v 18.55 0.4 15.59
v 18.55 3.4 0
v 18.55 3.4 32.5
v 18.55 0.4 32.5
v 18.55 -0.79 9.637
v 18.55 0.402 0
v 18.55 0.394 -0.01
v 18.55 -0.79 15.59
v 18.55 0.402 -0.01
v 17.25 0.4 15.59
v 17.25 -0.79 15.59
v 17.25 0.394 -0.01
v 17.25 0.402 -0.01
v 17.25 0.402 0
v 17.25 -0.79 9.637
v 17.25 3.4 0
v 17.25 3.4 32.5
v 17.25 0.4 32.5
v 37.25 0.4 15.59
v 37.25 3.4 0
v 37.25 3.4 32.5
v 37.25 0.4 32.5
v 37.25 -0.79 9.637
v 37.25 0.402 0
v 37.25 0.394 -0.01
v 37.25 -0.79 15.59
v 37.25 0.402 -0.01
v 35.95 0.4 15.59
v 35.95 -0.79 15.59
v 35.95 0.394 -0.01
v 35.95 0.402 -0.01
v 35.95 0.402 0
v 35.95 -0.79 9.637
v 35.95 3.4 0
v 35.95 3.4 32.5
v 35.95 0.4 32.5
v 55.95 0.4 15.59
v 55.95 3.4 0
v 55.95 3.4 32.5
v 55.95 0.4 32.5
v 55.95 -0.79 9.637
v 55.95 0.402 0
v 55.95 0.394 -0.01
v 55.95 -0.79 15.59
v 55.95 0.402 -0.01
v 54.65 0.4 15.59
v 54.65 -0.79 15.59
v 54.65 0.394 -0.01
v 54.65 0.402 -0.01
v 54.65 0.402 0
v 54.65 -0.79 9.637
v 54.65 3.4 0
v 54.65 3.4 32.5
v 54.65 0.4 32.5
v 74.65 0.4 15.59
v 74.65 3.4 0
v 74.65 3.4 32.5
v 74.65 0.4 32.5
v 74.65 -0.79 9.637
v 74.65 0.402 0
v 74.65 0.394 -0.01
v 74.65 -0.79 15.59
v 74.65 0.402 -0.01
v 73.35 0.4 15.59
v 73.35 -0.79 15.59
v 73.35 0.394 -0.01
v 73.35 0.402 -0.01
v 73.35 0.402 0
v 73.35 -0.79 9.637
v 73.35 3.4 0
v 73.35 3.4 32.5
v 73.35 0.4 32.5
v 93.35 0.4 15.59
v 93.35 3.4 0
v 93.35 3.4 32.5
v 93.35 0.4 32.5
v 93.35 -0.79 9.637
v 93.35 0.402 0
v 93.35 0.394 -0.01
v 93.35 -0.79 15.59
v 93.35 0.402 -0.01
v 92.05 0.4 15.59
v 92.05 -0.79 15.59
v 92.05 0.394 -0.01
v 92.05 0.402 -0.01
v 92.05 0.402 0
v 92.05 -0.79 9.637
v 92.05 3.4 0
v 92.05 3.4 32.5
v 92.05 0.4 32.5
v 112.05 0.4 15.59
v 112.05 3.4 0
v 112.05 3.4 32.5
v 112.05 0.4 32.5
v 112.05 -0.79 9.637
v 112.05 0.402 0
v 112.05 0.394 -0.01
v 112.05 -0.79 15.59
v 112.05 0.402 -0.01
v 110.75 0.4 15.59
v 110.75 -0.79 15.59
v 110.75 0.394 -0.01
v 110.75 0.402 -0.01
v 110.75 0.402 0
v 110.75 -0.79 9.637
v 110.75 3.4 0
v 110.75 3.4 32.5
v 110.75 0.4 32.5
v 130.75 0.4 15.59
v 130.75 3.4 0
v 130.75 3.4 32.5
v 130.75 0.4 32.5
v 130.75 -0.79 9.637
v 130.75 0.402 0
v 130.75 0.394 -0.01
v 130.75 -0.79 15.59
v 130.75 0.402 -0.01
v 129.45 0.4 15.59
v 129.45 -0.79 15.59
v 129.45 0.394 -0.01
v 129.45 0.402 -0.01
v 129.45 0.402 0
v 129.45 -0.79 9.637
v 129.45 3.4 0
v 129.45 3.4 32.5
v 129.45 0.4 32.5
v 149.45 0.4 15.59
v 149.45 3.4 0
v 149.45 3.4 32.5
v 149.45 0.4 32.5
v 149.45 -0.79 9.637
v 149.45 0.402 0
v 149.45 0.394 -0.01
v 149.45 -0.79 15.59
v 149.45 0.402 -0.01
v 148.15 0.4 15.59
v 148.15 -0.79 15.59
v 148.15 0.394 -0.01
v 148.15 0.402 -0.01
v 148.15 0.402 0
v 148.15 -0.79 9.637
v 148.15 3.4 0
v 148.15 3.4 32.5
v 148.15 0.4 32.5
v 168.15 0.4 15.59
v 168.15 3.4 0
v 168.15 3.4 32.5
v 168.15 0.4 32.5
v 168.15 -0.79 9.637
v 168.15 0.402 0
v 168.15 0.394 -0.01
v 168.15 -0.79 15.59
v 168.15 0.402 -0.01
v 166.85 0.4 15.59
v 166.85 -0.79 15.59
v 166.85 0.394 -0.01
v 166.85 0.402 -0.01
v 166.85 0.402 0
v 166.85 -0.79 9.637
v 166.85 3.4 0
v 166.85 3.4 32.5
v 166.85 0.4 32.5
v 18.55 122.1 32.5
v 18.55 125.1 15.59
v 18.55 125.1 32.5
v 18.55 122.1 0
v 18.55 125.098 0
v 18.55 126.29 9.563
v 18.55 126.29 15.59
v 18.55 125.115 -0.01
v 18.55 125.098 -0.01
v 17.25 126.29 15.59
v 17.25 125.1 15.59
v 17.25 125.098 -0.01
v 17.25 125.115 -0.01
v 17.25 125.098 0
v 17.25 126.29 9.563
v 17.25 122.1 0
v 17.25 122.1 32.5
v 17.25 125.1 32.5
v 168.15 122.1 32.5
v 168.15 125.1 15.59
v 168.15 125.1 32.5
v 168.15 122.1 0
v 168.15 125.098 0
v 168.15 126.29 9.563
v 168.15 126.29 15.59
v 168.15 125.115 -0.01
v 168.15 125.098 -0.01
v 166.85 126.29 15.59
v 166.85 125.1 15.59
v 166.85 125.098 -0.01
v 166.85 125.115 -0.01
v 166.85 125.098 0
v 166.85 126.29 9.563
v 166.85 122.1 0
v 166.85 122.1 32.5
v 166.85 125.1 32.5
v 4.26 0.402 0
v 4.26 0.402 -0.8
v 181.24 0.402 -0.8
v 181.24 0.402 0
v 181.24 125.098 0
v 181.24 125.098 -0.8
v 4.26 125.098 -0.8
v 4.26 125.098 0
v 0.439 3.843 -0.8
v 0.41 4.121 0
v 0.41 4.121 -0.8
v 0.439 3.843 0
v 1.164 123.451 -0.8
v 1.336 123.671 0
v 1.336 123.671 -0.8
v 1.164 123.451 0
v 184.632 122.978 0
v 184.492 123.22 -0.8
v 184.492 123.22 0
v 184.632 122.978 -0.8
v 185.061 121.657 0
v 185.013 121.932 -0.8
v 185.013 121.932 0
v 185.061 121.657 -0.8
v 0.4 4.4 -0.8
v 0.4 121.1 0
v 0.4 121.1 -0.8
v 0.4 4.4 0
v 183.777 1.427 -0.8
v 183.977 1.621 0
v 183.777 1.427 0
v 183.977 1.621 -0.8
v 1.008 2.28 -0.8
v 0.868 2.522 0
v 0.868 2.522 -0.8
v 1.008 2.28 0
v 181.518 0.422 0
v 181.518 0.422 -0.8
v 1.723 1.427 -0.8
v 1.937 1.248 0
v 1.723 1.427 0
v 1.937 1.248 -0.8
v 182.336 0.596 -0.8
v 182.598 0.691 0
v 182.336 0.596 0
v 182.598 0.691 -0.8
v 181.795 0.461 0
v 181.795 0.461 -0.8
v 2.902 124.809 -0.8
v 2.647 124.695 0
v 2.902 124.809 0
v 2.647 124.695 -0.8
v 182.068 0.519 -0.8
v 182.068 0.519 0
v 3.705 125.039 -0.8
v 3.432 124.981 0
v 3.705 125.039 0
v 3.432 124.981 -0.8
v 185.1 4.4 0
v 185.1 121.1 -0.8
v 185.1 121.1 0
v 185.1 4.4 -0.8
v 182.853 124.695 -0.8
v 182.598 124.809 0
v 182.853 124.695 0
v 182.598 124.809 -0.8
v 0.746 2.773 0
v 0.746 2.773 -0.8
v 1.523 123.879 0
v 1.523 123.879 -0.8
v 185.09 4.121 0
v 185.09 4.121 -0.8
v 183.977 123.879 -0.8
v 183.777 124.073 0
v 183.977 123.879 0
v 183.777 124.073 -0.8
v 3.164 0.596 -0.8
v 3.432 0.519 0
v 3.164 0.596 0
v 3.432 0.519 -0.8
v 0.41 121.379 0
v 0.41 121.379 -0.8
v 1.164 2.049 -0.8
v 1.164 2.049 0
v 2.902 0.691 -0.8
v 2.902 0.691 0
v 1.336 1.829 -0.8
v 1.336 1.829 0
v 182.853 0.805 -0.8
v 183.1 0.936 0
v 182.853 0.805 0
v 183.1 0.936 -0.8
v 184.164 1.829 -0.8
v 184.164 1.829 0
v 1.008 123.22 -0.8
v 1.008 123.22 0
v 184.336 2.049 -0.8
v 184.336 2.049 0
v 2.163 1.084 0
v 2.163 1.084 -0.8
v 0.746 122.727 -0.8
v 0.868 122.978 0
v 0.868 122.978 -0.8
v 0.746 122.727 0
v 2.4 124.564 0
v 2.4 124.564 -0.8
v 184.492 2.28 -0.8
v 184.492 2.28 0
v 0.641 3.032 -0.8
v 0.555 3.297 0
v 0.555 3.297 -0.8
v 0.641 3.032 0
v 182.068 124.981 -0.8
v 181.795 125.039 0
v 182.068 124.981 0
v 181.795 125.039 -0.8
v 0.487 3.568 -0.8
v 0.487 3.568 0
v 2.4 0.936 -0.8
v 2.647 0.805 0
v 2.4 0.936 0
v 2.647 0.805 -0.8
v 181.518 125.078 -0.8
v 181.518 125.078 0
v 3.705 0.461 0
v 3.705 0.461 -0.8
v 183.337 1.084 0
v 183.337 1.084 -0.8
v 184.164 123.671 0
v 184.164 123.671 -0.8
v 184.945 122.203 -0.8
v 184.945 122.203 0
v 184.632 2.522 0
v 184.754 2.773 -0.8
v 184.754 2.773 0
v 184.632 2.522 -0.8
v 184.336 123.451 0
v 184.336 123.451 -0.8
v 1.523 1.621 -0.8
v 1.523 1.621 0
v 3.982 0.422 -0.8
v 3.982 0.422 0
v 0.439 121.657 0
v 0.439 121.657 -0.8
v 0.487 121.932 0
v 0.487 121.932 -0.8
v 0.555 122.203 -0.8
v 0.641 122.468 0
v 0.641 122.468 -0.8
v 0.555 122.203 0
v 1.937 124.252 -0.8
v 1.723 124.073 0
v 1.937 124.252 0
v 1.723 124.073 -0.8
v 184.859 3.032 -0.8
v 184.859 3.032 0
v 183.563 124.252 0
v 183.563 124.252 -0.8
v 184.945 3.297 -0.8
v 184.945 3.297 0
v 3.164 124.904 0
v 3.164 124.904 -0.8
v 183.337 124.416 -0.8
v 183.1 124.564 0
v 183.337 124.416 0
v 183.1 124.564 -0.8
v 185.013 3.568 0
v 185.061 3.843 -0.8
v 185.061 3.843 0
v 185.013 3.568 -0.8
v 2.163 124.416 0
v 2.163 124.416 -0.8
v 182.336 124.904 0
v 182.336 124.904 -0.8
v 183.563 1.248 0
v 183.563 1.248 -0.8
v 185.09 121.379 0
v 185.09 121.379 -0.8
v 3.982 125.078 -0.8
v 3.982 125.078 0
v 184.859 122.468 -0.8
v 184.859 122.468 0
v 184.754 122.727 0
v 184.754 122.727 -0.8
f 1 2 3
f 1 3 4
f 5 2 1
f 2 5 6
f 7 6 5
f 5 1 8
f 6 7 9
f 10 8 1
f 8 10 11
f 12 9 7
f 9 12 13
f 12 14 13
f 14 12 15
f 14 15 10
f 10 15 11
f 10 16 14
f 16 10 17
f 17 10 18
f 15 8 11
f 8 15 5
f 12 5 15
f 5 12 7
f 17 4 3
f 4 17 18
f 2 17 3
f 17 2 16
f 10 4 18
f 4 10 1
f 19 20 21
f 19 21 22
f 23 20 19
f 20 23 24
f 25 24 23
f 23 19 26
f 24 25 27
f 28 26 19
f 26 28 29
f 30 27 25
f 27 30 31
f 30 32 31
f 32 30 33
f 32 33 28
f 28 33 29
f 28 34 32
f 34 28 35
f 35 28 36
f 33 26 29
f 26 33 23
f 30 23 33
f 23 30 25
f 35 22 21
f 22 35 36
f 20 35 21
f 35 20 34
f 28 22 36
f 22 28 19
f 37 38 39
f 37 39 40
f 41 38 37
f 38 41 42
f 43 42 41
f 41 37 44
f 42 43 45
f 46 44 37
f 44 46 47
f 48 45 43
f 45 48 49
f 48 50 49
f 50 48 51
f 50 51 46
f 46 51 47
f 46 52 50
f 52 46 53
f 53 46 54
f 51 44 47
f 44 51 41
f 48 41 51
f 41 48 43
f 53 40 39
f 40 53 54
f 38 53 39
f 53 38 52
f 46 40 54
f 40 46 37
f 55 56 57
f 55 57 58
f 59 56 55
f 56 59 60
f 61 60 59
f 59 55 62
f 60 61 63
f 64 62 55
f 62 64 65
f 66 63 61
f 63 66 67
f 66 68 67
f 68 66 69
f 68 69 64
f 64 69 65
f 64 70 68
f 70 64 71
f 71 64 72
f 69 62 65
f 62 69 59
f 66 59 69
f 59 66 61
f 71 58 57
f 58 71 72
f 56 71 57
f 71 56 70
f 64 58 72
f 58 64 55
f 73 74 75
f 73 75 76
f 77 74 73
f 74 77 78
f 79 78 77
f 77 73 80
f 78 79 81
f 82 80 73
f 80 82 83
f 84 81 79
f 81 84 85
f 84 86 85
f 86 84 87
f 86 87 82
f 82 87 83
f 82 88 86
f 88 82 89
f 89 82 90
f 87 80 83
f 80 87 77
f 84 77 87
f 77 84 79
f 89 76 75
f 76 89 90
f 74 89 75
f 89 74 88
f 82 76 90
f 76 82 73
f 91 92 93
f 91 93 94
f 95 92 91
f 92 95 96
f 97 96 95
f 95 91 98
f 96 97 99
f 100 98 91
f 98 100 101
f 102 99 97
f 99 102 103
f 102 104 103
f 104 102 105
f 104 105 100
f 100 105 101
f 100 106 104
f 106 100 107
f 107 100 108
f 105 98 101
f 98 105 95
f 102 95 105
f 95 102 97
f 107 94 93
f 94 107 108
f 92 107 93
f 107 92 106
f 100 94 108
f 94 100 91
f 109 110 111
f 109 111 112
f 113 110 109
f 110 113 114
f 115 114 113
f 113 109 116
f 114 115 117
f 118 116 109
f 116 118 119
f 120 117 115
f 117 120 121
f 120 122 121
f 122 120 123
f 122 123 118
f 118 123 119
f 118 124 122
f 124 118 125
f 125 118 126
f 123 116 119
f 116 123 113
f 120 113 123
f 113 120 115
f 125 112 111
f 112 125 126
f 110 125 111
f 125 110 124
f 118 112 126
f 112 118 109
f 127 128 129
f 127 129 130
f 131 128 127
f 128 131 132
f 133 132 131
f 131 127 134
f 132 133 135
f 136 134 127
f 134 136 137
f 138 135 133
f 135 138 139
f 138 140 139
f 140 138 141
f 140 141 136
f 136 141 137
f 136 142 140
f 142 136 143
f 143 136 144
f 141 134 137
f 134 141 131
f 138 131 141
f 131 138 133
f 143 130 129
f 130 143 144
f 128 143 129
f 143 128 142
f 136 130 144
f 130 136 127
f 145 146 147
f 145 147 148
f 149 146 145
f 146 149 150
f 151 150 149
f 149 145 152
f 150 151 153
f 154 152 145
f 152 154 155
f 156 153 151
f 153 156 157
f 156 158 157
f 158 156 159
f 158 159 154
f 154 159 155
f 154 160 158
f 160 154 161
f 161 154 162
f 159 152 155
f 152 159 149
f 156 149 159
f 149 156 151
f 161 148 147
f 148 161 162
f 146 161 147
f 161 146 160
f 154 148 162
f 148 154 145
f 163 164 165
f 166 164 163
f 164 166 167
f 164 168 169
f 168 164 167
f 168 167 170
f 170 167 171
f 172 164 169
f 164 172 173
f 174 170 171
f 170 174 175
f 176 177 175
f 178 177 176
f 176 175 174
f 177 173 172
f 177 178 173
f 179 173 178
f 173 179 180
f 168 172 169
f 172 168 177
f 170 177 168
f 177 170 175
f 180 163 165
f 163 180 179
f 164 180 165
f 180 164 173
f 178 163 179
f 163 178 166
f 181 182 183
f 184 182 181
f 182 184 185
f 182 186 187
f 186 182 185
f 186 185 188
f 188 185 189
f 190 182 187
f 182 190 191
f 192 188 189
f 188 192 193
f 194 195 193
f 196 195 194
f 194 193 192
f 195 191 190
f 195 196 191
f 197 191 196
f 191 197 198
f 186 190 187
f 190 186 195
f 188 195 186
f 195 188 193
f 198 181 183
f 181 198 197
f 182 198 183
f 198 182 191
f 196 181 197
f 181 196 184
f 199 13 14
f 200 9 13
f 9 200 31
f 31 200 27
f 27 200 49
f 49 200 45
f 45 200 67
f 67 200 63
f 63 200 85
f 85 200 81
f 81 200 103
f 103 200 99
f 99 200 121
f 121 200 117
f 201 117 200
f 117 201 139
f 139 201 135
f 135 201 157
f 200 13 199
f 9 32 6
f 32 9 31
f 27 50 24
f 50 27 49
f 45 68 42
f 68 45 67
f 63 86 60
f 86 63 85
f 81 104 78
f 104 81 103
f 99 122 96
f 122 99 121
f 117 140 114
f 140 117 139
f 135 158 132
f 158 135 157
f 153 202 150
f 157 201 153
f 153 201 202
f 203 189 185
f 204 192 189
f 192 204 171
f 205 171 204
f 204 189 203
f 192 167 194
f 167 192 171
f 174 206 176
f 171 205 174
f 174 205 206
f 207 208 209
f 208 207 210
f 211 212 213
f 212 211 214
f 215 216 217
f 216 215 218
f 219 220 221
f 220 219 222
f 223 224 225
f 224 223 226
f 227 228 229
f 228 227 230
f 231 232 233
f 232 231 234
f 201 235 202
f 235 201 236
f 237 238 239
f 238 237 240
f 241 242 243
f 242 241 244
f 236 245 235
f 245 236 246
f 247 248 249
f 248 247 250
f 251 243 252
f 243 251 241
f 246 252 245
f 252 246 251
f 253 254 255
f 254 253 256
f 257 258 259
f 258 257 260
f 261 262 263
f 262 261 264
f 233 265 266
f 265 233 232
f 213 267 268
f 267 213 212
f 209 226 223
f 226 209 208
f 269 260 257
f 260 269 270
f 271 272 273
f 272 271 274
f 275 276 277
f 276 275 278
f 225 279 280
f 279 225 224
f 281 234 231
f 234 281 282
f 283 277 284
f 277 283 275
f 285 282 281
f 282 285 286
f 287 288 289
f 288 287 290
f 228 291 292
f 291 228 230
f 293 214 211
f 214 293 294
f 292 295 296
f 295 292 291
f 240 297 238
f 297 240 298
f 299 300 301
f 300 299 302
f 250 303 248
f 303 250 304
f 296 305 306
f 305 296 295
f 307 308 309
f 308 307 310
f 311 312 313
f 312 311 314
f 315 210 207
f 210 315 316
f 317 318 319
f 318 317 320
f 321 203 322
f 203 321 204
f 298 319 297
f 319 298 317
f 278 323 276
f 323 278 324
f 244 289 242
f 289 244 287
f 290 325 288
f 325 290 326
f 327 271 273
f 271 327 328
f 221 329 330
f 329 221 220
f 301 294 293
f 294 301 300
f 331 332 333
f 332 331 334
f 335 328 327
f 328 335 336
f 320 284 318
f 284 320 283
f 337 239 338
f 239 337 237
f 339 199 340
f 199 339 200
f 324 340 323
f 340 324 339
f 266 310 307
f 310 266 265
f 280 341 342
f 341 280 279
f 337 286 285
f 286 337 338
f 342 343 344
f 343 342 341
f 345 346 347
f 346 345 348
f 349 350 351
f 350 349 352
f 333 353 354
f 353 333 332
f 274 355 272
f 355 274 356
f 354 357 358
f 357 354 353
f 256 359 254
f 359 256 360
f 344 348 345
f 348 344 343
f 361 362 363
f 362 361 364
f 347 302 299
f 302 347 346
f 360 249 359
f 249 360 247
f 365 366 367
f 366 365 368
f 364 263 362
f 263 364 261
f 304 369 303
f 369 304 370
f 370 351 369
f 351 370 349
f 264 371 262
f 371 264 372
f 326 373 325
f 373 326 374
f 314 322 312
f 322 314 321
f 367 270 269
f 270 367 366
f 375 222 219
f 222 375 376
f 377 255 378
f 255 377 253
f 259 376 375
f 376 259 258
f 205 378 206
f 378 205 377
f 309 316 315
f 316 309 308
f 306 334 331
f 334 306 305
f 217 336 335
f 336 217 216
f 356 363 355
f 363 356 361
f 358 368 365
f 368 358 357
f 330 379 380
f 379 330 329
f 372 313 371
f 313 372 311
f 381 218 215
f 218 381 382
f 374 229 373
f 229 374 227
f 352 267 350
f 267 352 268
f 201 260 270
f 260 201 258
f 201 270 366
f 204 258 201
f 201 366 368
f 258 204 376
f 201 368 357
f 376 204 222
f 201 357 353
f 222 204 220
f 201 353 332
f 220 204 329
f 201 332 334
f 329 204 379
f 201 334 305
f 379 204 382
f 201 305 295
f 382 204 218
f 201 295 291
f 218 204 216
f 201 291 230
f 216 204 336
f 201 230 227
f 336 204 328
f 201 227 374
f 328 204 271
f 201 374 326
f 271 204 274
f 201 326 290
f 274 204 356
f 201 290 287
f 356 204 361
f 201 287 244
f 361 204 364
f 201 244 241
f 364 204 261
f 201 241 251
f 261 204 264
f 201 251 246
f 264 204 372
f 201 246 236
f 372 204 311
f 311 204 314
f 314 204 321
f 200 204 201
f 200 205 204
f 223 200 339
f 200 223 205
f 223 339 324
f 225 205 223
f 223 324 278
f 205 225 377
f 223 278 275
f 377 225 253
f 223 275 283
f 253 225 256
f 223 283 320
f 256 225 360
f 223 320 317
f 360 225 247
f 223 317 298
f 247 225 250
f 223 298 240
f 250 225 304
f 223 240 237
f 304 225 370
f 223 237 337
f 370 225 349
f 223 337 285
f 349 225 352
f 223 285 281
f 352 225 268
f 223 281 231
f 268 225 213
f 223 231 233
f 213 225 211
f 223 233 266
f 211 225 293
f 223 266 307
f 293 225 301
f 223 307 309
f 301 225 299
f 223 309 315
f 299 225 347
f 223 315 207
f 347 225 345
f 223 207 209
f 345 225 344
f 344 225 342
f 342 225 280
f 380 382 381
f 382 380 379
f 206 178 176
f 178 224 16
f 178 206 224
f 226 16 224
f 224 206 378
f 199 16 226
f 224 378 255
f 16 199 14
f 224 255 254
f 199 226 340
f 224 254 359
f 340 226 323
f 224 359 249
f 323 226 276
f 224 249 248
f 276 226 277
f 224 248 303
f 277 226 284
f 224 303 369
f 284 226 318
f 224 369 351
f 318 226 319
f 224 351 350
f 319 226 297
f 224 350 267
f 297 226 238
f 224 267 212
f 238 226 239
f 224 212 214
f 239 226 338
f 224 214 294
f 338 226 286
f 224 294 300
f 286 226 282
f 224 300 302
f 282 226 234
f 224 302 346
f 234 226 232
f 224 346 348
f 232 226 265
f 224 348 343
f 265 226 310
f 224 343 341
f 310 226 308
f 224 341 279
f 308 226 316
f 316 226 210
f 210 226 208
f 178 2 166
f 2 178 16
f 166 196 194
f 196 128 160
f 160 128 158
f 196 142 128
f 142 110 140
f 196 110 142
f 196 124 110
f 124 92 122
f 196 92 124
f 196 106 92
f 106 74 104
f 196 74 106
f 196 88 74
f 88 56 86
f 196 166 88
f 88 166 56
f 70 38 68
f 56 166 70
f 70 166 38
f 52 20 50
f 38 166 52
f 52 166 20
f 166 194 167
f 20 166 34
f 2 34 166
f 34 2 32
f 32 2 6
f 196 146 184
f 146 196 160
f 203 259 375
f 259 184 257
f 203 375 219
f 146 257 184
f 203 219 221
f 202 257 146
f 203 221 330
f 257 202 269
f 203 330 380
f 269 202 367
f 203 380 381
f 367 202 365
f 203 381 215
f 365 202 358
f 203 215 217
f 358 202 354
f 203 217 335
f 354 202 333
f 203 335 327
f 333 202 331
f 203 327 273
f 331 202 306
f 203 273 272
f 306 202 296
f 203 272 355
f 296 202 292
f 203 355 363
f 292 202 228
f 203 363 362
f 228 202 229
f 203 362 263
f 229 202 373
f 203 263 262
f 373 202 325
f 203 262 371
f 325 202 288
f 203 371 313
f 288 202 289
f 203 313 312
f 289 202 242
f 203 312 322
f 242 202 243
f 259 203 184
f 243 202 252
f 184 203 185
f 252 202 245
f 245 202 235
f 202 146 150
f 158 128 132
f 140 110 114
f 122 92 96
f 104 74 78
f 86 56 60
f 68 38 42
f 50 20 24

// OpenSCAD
// file: ../../Base/Constants.scad
// Fischertechnik Box Foundation
// Constants

// Constant values necessary for multiple elements

// Base constants
dividerThickness = 1.2;
excess = 0.01;
fragments = 90;
tolerance = 0.8;

// Gets the thickness of a divider 
function getDividerThickness() = dividerThickness;

// Gets the excess that is used to merge walls into each other
function getExcess() = excess;

// Gets amount of fragments of a cylinder
function getFragments() = fragments;

// Gets the inner tolerance of a frame to each side
function getTolerance() = tolerance;


// Fischertechnik specific constants
axisDiameter = 4;
axisBottomDiameter = axisDiameter + 1;
axisTolerance = 0.2;

// Gets axis diameter of Fischertechnik axis
function getAxisDiameter() = axisDiameter;

// Gets axis diameter tolerance (subtracted for element axis)
function getAxisTolerance() = axisTolerance;

// Gets the axis diameter for standing axis
function getStandAxisDiameter() = getAxisDiameter() - getAxisTolerance();

// Gets axis bottom diameter for thicker part at the bottom
function getAxisBottomDiameter() = axisBottomDiameter;

standardEdgeDistance = 2.5;
standardWebDistance = 11.5;
standardCornerLength = 15;

// gets the standard distance to the wall of the box for dockable frames with webs
function getStandardEdgeDistance() = standardEdgeDistance;

// gets the standard distance of each web to the corner of the dockable frame
function getStandardWebDistance() = standardWebDistance;

// gets the standard length of the corner walls of a dockable frame
function getStandardCornerLength() = standardCornerLength;

tubeWallFactor = 0.8;

// gets the wall thickness of a tube.
function getTubeWallThickness() = tubeWallFactor * getDividerThickness();

smallPartsFrameHeight = 20;

// gets the frame height for docked small parts boxes.
function getSmallPartsFrameHeight() = smallPartsFrameHeight;

hubRingDiameter = 19.5;
hubRingLevelDiameter = 21;

// gets the diameter of a tube matching the inner ring of a wheel
function getHubRingDiameter() = hubRingDiameter;

// gets the diameter of a hub tube with a thicker diameter
function getHubRingLevelDiameter() = hubRingLevelDiameter;
// file: ../../Base/PlacementOptions.scad
// Fischertechnik Box Foundation
// Placement Options

// Alignment
NoAlign = 0;
AlignLeft = 1;
AlignBottom = 2;
AlignCenter = 3;
AlignRight = 4;
AlignTop = 5;

// Element rotation degree steps
rotations = [0, -90, -180, -270];

// Rotation
NoRotation = 0;
Rotate0 = 0;
Rotate90 = 1;
Rotate180 = 2;
Rotate270 = 3;

// Docking (seen from above)
NoDock = -1;
DockLeft = 0;
DockTop = 1;
DockRight = 2;
DockCorner = 2;
DockBottom = 3;

// Web corners
LowerLeft = 0;
UpperLeft = 1;
UpperRight = 2;
LowerRight = 3;

// Web position relative to corner
LeftOfCorner = 0;
RightOfCorner = 1;
// file: ../../Base/BoxInlays.scad
// Fischertechnik Box Foundation
// Box Inlays for Original Sorting Boxes

use <Constants.scad>
use <Boxes.scad>

include <PlacementOptions.scad>

box500Width = 380;
box500Depth = 190;

baseThickness = 0.8;
radius = 4;

// getInlayBaseSpace(space)
// Gets the usable space of an inlay with the specified size.
// space = The size of the bottom of the inlay without tolerance

function getInlayBaseSpace(space) = [space.x - getTolerance(), space.y - getTolerance()];

// Creates the bottom with the specified size.
// space = The size of the bottom

module InlayBase(space) {
    RoundedCornerPlate(space.x - getTolerance(), space.y - getTolerance(), baseThickness, radius);
}

halfTolerance = getTolerance()/2;

// Creates an inlay for the Fischertechnik empty box 130x190 mm and places it at position 0,0
// The inlay consists of a thin layer at the bottom where the elements are placed. Use 
// Box190InlayWeb to place webs that hold the inlay in position.

module Box190Inlay() {
    translate([halfTolerance, halfTolerance, -baseThickness]) {
        InlayBase(getBox190Space());
    }
}

inlayWebDepth = 3;

// Box190InlayWeb(align, position)
// Creates a web for snapping the inlay into the box. Use multiple webs per side.
// align = AlignTop or AlignBottom
// position = Index of the recess in the boy where to snap in (from left to right)
// inlayWebDepth = Depth of the web (default is 3 mm)

module Box190InlayWeb(align, position, inlayWebDepth=inlayWebDepth) {

    inlayWebThickness = 1.3;
    inlayWebHeight = getBoxUsageHeight();    
    
    inlayWebRecessHeight = 16;
    inlayWebRecessDepth = 1.2;
    inlayWebRecessAngle = 7.0;

    inlayWebRecessWidth = 1.4;
    inlayWebCount = 9;
    inlayWebCompleteWidth = 151.0;
    inlayWebDistance = (inlayWebCompleteWidth - inlayWebCount * inlayWebRecessWidth) / (inlayWebCount - 1) + inlayWebRecessWidth;
    inlayWebStart = (getBox190Space().x - inlayWebCompleteWidth) / 2;

    module InlayWeb() {
        cube([inlayWebThickness, inlayWebDepth, inlayWebHeight + getExcess()]);
        translate([0, align==AlignTop ? (inlayWebDepth-getExcess()) : (getExcess()-inlayWebRecessDepth)]) {
            difference() {
                cube([inlayWebThickness, inlayWebRecessDepth, inlayWebRecessHeight - halfTolerance]);
                translate([-getExcess(), 0, -0.2])
                    rotate([align==AlignTop ? -inlayWebRecessAngle : inlayWebRecessAngle,0,0])
                        cube([inlayWebThickness+2*getExcess(), inlayWebRecessDepth, inlayWebRecessHeight]);
            }
        }
    }
    
    x = inlayWebStart + position * inlayWebDistance;
    y = (align == AlignTop) ? (getBox190Space().y - inlayWebDepth - halfTolerance) : halfTolerance;

    translate([x, y, -getExcess()])
        InlayWeb();
}
// file: ../../Base/Boxes.scad
// Fischertechnik Box Foundation
// Pre-designed Boxes

use <Constants.scad>

include <PlacementOptions.scad>

box190Width = 190;
box190Depth = 130;
box130Width = 130;
box130Depth = 95;

// Values are from an original ec3 box
topBottomDifference = 1.5;
outerHeight = 40;
innerHeight = 38.2;
baseThickness = outerHeight - innerHeight;
stackExcess = 5.7;
radius = 3.5;
wallThickness = 1.5;
tolerance = 0.2;
stackOffset = innerHeight - stackExcess;

boxUsageHeight = stackOffset;
boxWallThickness = wallThickness;
boxBaseThickness = baseThickness;
boxWebWidth = 3.0;

// getBoxWallThickness()
// Gets the wall thickness of a Fischertechnik Box
function getBoxWallThickness() = boxWallThickness;

// getBoxUsageHeight()
// Gets the usable height of a Fischertechnik box
function getBoxUsageHeight() = boxUsageHeight;

// getBoxInnerHeight()
// Gets the inner height of a Fischertechnik box, including the stack excess
function getBoxInnerHeight() = innerHeight;

// getBoxBaseThickness()
// Gets the thickness of the Fischertechnik box base.
function getBoxBaseThickness() = boxBaseThickness;

// getBoxWebWidth()
// Gets the width of a box web
function getBoxWebWidth() = boxWebWidth;

// getBox190Space()
// Gets the usable inner space of a Box 190 as an x/y-list
function getBox190Space() = [
    box190Width - 2*getBoxWallThickness() - topBottomDifference, 
    box190Depth - 2*getBoxWallThickness() - topBottomDifference ];

// RoundedCornerPlate(width, depth, height, radius)
// Creates a body plate with rounded corners for a box. Used
// also to create the complete box with the hull module.
// width = Width of the plate
// depth = depth of the plate 
// height = thickness of the plate
// radius = radius of the rounded corner
module RoundedCornerPlate(width, depth, height, radius) {
    translate([radius, radius])
    hull() {
        w = width-2*radius;
        d = depth-2*radius;
        cube([w, d, height]);
        cylinder(height, r=radius, $fn=getFragments());
        translate([w, 0])
            cylinder(height, r=radius, $fn=getFragments());
        translate([w, d])
            cylinder(height, r=radius, $fn=getFragments());
        translate([0, d])
            cylinder(height, r=radius, $fn=getFragments());
    }
}

// BoxBase(width, depth)
// Creates an empty stackable Fischertechnik compatible box
// width = Outer width of the box (190, 130, ...)
// depth = Outer depth of the box (130, 95, ...)

module BoxBase(width, depth, height=outerHeight) {    
    thinPlate = 0.01;

    innerHeight = height - baseThickness;    
    
    module Body(tolerance=tolerance) {
        hull() {
            // Bottom with tolerance to fit into the original boxes when stacked
            translate([-wallThickness+tolerance, -wallThickness+tolerance, -baseThickness])
                RoundedCornerPlate(width-topBottomDifference-2*tolerance, depth-topBottomDifference-2*tolerance, thinPlate, radius);
            
            // Top
            translate([-wallThickness-topBottomDifference/2, -wallThickness-topBottomDifference/2, innerHeight-thinPlate])
                RoundedCornerPlate(width, depth, thinPlate, radius);
         }
    }

    module Cutoff() {
        hull() {
            coWidth = width - 2*wallThickness;
            coDepth = depth - 2*wallThickness;
            
            // Bottom
            RoundedCornerPlate(coWidth-topBottomDifference, coDepth-topBottomDifference, thinPlate, radius);

            // Top
            translate([-topBottomDifference/2, -topBottomDifference/2, innerHeight+thinPlate]) 
                RoundedCornerPlate(coWidth, coDepth, thinPlate, radius);
        }
    }
    
    difference() {        
        Body();
        Cutoff();
        stackOffset = innerHeight - stackExcess;
        translate([0, 0, stackOffset + baseThickness])
            Body(tolerance=0);
    }
}

// Creates the Fischertechnik empty box 130x190 mm and places it at position 0,0
// 190x130 are the outer sizes, the inner space is slightly smaller. Use getBox190Space() to get the inner sizes.
// The box is positioned that the usable inner space is at the 0,0,0 position.

module Box190() {
    BoxBase(box190Width, box190Depth);
}

// Gets the usable inner space of a Box 130 as an x/y-list
function getBox130Space() = [
    box130Width - 2*getBoxWallThickness() - topBottomDifference, 
    box130Depth - 2*getBoxWallThickness() - topBottomDifference ];

// Creates the Fischertechnik empty box 95x130 mm and places it at position 0,0
// 190x130 are the outer sizes, the inner space is slightly smaller. Use getBox190Space() to get the inner sizes.
// The box is positioned that the usable inner space is at the 0,0,0 position.

module Box130() {
    BoxBase(box130Width, box130Depth);
}

// Creates a web at the specified box walls
// corner 0 = LowerLeft, 1 = UpperLeft, 2 = UpperRight, 3 = LowerRight
// side 0 = LeftOfCorner, 1 = RightOfCorner
// distance = Distance in mm from the corner
// boxSpace = inner width and depth of the box (default: Box 190)
// webWidth = length of the web (default is 3 mms)
// webThickness = thickness of the web (default is 1 mm)

module BoxWeb(corner, side, distance, boxSpace=getBox190Space(), webWidth=getBoxWebWidth(), webThickness=1.0) {
    sink = getBoxWallThickness()/2;

    width = (corner % 2 == 0) ? 
            (side == LeftOfCorner ? webWidth : webThickness) :
            (side == LeftOfCorner ? webThickness : webWidth);

    depth = (corner % 2 == 0) ? 
            (side == RightOfCorner ? webWidth : webThickness) :
            (side == RightOfCorner ? webThickness : webWidth);
    
    xDiff = corner == LowerLeft ? 
                (side == LeftOfCorner ? -sink : distance) :
            (corner == UpperLeft ?                
                (side == LeftOfCorner ? distance : -sink) :
            (corner == UpperRight ?
                (side == LeftOfCorner ? boxSpace.x-webWidth+sink : boxSpace.x-distance-webThickness) :
                (side == LeftOfCorner ? boxSpace.x-distance-webThickness: boxSpace.x-webWidth+sink)));

    yDiff = corner == LowerLeft ? 
                (side == RightOfCorner ? -sink : distance) :
            (corner == UpperLeft ?
                (side == RightOfCorner ? boxSpace.y-distance : boxSpace.y-webWidth+sink) :
            (corner == UpperRight ?
                (side == RightOfCorner ? boxSpace.y-webWidth+sink : boxSpace.y-distance) :
                (side == RightOfCorner ? distance : -sink)));
    
    translate([xDiff, yDiff, -getExcess()])
        cube([width, depth, boxUsageHeight + 2*getExcess()]);
}
// main file
// Fischertechnik Box Foundation
// BoxeInlays Test
// Test Box190Inlay

use <../../Base/Boxes.scad>
use <../../Base/BoxInlays.scad>

include <../../Base/PlacementOptions.scad>

Box190Inlay();

Box190InlayWeb(AlignBottom, 0);
Box190InlayWeb(AlignBottom, 1);
Box190InlayWeb(AlignBottom, 2);
Box190InlayWeb(AlignBottom, 3);
Box190InlayWeb(AlignBottom, 4);
Box190InlayWeb(AlignBottom, 5);
Box190InlayWeb(AlignBottom, 6);
Box190InlayWeb(AlignBottom, 7);
Box190InlayWeb(AlignBottom, 8);

Box190InlayWeb(AlignTop, 0);
Box190InlayWeb(AlignTop, 8);
